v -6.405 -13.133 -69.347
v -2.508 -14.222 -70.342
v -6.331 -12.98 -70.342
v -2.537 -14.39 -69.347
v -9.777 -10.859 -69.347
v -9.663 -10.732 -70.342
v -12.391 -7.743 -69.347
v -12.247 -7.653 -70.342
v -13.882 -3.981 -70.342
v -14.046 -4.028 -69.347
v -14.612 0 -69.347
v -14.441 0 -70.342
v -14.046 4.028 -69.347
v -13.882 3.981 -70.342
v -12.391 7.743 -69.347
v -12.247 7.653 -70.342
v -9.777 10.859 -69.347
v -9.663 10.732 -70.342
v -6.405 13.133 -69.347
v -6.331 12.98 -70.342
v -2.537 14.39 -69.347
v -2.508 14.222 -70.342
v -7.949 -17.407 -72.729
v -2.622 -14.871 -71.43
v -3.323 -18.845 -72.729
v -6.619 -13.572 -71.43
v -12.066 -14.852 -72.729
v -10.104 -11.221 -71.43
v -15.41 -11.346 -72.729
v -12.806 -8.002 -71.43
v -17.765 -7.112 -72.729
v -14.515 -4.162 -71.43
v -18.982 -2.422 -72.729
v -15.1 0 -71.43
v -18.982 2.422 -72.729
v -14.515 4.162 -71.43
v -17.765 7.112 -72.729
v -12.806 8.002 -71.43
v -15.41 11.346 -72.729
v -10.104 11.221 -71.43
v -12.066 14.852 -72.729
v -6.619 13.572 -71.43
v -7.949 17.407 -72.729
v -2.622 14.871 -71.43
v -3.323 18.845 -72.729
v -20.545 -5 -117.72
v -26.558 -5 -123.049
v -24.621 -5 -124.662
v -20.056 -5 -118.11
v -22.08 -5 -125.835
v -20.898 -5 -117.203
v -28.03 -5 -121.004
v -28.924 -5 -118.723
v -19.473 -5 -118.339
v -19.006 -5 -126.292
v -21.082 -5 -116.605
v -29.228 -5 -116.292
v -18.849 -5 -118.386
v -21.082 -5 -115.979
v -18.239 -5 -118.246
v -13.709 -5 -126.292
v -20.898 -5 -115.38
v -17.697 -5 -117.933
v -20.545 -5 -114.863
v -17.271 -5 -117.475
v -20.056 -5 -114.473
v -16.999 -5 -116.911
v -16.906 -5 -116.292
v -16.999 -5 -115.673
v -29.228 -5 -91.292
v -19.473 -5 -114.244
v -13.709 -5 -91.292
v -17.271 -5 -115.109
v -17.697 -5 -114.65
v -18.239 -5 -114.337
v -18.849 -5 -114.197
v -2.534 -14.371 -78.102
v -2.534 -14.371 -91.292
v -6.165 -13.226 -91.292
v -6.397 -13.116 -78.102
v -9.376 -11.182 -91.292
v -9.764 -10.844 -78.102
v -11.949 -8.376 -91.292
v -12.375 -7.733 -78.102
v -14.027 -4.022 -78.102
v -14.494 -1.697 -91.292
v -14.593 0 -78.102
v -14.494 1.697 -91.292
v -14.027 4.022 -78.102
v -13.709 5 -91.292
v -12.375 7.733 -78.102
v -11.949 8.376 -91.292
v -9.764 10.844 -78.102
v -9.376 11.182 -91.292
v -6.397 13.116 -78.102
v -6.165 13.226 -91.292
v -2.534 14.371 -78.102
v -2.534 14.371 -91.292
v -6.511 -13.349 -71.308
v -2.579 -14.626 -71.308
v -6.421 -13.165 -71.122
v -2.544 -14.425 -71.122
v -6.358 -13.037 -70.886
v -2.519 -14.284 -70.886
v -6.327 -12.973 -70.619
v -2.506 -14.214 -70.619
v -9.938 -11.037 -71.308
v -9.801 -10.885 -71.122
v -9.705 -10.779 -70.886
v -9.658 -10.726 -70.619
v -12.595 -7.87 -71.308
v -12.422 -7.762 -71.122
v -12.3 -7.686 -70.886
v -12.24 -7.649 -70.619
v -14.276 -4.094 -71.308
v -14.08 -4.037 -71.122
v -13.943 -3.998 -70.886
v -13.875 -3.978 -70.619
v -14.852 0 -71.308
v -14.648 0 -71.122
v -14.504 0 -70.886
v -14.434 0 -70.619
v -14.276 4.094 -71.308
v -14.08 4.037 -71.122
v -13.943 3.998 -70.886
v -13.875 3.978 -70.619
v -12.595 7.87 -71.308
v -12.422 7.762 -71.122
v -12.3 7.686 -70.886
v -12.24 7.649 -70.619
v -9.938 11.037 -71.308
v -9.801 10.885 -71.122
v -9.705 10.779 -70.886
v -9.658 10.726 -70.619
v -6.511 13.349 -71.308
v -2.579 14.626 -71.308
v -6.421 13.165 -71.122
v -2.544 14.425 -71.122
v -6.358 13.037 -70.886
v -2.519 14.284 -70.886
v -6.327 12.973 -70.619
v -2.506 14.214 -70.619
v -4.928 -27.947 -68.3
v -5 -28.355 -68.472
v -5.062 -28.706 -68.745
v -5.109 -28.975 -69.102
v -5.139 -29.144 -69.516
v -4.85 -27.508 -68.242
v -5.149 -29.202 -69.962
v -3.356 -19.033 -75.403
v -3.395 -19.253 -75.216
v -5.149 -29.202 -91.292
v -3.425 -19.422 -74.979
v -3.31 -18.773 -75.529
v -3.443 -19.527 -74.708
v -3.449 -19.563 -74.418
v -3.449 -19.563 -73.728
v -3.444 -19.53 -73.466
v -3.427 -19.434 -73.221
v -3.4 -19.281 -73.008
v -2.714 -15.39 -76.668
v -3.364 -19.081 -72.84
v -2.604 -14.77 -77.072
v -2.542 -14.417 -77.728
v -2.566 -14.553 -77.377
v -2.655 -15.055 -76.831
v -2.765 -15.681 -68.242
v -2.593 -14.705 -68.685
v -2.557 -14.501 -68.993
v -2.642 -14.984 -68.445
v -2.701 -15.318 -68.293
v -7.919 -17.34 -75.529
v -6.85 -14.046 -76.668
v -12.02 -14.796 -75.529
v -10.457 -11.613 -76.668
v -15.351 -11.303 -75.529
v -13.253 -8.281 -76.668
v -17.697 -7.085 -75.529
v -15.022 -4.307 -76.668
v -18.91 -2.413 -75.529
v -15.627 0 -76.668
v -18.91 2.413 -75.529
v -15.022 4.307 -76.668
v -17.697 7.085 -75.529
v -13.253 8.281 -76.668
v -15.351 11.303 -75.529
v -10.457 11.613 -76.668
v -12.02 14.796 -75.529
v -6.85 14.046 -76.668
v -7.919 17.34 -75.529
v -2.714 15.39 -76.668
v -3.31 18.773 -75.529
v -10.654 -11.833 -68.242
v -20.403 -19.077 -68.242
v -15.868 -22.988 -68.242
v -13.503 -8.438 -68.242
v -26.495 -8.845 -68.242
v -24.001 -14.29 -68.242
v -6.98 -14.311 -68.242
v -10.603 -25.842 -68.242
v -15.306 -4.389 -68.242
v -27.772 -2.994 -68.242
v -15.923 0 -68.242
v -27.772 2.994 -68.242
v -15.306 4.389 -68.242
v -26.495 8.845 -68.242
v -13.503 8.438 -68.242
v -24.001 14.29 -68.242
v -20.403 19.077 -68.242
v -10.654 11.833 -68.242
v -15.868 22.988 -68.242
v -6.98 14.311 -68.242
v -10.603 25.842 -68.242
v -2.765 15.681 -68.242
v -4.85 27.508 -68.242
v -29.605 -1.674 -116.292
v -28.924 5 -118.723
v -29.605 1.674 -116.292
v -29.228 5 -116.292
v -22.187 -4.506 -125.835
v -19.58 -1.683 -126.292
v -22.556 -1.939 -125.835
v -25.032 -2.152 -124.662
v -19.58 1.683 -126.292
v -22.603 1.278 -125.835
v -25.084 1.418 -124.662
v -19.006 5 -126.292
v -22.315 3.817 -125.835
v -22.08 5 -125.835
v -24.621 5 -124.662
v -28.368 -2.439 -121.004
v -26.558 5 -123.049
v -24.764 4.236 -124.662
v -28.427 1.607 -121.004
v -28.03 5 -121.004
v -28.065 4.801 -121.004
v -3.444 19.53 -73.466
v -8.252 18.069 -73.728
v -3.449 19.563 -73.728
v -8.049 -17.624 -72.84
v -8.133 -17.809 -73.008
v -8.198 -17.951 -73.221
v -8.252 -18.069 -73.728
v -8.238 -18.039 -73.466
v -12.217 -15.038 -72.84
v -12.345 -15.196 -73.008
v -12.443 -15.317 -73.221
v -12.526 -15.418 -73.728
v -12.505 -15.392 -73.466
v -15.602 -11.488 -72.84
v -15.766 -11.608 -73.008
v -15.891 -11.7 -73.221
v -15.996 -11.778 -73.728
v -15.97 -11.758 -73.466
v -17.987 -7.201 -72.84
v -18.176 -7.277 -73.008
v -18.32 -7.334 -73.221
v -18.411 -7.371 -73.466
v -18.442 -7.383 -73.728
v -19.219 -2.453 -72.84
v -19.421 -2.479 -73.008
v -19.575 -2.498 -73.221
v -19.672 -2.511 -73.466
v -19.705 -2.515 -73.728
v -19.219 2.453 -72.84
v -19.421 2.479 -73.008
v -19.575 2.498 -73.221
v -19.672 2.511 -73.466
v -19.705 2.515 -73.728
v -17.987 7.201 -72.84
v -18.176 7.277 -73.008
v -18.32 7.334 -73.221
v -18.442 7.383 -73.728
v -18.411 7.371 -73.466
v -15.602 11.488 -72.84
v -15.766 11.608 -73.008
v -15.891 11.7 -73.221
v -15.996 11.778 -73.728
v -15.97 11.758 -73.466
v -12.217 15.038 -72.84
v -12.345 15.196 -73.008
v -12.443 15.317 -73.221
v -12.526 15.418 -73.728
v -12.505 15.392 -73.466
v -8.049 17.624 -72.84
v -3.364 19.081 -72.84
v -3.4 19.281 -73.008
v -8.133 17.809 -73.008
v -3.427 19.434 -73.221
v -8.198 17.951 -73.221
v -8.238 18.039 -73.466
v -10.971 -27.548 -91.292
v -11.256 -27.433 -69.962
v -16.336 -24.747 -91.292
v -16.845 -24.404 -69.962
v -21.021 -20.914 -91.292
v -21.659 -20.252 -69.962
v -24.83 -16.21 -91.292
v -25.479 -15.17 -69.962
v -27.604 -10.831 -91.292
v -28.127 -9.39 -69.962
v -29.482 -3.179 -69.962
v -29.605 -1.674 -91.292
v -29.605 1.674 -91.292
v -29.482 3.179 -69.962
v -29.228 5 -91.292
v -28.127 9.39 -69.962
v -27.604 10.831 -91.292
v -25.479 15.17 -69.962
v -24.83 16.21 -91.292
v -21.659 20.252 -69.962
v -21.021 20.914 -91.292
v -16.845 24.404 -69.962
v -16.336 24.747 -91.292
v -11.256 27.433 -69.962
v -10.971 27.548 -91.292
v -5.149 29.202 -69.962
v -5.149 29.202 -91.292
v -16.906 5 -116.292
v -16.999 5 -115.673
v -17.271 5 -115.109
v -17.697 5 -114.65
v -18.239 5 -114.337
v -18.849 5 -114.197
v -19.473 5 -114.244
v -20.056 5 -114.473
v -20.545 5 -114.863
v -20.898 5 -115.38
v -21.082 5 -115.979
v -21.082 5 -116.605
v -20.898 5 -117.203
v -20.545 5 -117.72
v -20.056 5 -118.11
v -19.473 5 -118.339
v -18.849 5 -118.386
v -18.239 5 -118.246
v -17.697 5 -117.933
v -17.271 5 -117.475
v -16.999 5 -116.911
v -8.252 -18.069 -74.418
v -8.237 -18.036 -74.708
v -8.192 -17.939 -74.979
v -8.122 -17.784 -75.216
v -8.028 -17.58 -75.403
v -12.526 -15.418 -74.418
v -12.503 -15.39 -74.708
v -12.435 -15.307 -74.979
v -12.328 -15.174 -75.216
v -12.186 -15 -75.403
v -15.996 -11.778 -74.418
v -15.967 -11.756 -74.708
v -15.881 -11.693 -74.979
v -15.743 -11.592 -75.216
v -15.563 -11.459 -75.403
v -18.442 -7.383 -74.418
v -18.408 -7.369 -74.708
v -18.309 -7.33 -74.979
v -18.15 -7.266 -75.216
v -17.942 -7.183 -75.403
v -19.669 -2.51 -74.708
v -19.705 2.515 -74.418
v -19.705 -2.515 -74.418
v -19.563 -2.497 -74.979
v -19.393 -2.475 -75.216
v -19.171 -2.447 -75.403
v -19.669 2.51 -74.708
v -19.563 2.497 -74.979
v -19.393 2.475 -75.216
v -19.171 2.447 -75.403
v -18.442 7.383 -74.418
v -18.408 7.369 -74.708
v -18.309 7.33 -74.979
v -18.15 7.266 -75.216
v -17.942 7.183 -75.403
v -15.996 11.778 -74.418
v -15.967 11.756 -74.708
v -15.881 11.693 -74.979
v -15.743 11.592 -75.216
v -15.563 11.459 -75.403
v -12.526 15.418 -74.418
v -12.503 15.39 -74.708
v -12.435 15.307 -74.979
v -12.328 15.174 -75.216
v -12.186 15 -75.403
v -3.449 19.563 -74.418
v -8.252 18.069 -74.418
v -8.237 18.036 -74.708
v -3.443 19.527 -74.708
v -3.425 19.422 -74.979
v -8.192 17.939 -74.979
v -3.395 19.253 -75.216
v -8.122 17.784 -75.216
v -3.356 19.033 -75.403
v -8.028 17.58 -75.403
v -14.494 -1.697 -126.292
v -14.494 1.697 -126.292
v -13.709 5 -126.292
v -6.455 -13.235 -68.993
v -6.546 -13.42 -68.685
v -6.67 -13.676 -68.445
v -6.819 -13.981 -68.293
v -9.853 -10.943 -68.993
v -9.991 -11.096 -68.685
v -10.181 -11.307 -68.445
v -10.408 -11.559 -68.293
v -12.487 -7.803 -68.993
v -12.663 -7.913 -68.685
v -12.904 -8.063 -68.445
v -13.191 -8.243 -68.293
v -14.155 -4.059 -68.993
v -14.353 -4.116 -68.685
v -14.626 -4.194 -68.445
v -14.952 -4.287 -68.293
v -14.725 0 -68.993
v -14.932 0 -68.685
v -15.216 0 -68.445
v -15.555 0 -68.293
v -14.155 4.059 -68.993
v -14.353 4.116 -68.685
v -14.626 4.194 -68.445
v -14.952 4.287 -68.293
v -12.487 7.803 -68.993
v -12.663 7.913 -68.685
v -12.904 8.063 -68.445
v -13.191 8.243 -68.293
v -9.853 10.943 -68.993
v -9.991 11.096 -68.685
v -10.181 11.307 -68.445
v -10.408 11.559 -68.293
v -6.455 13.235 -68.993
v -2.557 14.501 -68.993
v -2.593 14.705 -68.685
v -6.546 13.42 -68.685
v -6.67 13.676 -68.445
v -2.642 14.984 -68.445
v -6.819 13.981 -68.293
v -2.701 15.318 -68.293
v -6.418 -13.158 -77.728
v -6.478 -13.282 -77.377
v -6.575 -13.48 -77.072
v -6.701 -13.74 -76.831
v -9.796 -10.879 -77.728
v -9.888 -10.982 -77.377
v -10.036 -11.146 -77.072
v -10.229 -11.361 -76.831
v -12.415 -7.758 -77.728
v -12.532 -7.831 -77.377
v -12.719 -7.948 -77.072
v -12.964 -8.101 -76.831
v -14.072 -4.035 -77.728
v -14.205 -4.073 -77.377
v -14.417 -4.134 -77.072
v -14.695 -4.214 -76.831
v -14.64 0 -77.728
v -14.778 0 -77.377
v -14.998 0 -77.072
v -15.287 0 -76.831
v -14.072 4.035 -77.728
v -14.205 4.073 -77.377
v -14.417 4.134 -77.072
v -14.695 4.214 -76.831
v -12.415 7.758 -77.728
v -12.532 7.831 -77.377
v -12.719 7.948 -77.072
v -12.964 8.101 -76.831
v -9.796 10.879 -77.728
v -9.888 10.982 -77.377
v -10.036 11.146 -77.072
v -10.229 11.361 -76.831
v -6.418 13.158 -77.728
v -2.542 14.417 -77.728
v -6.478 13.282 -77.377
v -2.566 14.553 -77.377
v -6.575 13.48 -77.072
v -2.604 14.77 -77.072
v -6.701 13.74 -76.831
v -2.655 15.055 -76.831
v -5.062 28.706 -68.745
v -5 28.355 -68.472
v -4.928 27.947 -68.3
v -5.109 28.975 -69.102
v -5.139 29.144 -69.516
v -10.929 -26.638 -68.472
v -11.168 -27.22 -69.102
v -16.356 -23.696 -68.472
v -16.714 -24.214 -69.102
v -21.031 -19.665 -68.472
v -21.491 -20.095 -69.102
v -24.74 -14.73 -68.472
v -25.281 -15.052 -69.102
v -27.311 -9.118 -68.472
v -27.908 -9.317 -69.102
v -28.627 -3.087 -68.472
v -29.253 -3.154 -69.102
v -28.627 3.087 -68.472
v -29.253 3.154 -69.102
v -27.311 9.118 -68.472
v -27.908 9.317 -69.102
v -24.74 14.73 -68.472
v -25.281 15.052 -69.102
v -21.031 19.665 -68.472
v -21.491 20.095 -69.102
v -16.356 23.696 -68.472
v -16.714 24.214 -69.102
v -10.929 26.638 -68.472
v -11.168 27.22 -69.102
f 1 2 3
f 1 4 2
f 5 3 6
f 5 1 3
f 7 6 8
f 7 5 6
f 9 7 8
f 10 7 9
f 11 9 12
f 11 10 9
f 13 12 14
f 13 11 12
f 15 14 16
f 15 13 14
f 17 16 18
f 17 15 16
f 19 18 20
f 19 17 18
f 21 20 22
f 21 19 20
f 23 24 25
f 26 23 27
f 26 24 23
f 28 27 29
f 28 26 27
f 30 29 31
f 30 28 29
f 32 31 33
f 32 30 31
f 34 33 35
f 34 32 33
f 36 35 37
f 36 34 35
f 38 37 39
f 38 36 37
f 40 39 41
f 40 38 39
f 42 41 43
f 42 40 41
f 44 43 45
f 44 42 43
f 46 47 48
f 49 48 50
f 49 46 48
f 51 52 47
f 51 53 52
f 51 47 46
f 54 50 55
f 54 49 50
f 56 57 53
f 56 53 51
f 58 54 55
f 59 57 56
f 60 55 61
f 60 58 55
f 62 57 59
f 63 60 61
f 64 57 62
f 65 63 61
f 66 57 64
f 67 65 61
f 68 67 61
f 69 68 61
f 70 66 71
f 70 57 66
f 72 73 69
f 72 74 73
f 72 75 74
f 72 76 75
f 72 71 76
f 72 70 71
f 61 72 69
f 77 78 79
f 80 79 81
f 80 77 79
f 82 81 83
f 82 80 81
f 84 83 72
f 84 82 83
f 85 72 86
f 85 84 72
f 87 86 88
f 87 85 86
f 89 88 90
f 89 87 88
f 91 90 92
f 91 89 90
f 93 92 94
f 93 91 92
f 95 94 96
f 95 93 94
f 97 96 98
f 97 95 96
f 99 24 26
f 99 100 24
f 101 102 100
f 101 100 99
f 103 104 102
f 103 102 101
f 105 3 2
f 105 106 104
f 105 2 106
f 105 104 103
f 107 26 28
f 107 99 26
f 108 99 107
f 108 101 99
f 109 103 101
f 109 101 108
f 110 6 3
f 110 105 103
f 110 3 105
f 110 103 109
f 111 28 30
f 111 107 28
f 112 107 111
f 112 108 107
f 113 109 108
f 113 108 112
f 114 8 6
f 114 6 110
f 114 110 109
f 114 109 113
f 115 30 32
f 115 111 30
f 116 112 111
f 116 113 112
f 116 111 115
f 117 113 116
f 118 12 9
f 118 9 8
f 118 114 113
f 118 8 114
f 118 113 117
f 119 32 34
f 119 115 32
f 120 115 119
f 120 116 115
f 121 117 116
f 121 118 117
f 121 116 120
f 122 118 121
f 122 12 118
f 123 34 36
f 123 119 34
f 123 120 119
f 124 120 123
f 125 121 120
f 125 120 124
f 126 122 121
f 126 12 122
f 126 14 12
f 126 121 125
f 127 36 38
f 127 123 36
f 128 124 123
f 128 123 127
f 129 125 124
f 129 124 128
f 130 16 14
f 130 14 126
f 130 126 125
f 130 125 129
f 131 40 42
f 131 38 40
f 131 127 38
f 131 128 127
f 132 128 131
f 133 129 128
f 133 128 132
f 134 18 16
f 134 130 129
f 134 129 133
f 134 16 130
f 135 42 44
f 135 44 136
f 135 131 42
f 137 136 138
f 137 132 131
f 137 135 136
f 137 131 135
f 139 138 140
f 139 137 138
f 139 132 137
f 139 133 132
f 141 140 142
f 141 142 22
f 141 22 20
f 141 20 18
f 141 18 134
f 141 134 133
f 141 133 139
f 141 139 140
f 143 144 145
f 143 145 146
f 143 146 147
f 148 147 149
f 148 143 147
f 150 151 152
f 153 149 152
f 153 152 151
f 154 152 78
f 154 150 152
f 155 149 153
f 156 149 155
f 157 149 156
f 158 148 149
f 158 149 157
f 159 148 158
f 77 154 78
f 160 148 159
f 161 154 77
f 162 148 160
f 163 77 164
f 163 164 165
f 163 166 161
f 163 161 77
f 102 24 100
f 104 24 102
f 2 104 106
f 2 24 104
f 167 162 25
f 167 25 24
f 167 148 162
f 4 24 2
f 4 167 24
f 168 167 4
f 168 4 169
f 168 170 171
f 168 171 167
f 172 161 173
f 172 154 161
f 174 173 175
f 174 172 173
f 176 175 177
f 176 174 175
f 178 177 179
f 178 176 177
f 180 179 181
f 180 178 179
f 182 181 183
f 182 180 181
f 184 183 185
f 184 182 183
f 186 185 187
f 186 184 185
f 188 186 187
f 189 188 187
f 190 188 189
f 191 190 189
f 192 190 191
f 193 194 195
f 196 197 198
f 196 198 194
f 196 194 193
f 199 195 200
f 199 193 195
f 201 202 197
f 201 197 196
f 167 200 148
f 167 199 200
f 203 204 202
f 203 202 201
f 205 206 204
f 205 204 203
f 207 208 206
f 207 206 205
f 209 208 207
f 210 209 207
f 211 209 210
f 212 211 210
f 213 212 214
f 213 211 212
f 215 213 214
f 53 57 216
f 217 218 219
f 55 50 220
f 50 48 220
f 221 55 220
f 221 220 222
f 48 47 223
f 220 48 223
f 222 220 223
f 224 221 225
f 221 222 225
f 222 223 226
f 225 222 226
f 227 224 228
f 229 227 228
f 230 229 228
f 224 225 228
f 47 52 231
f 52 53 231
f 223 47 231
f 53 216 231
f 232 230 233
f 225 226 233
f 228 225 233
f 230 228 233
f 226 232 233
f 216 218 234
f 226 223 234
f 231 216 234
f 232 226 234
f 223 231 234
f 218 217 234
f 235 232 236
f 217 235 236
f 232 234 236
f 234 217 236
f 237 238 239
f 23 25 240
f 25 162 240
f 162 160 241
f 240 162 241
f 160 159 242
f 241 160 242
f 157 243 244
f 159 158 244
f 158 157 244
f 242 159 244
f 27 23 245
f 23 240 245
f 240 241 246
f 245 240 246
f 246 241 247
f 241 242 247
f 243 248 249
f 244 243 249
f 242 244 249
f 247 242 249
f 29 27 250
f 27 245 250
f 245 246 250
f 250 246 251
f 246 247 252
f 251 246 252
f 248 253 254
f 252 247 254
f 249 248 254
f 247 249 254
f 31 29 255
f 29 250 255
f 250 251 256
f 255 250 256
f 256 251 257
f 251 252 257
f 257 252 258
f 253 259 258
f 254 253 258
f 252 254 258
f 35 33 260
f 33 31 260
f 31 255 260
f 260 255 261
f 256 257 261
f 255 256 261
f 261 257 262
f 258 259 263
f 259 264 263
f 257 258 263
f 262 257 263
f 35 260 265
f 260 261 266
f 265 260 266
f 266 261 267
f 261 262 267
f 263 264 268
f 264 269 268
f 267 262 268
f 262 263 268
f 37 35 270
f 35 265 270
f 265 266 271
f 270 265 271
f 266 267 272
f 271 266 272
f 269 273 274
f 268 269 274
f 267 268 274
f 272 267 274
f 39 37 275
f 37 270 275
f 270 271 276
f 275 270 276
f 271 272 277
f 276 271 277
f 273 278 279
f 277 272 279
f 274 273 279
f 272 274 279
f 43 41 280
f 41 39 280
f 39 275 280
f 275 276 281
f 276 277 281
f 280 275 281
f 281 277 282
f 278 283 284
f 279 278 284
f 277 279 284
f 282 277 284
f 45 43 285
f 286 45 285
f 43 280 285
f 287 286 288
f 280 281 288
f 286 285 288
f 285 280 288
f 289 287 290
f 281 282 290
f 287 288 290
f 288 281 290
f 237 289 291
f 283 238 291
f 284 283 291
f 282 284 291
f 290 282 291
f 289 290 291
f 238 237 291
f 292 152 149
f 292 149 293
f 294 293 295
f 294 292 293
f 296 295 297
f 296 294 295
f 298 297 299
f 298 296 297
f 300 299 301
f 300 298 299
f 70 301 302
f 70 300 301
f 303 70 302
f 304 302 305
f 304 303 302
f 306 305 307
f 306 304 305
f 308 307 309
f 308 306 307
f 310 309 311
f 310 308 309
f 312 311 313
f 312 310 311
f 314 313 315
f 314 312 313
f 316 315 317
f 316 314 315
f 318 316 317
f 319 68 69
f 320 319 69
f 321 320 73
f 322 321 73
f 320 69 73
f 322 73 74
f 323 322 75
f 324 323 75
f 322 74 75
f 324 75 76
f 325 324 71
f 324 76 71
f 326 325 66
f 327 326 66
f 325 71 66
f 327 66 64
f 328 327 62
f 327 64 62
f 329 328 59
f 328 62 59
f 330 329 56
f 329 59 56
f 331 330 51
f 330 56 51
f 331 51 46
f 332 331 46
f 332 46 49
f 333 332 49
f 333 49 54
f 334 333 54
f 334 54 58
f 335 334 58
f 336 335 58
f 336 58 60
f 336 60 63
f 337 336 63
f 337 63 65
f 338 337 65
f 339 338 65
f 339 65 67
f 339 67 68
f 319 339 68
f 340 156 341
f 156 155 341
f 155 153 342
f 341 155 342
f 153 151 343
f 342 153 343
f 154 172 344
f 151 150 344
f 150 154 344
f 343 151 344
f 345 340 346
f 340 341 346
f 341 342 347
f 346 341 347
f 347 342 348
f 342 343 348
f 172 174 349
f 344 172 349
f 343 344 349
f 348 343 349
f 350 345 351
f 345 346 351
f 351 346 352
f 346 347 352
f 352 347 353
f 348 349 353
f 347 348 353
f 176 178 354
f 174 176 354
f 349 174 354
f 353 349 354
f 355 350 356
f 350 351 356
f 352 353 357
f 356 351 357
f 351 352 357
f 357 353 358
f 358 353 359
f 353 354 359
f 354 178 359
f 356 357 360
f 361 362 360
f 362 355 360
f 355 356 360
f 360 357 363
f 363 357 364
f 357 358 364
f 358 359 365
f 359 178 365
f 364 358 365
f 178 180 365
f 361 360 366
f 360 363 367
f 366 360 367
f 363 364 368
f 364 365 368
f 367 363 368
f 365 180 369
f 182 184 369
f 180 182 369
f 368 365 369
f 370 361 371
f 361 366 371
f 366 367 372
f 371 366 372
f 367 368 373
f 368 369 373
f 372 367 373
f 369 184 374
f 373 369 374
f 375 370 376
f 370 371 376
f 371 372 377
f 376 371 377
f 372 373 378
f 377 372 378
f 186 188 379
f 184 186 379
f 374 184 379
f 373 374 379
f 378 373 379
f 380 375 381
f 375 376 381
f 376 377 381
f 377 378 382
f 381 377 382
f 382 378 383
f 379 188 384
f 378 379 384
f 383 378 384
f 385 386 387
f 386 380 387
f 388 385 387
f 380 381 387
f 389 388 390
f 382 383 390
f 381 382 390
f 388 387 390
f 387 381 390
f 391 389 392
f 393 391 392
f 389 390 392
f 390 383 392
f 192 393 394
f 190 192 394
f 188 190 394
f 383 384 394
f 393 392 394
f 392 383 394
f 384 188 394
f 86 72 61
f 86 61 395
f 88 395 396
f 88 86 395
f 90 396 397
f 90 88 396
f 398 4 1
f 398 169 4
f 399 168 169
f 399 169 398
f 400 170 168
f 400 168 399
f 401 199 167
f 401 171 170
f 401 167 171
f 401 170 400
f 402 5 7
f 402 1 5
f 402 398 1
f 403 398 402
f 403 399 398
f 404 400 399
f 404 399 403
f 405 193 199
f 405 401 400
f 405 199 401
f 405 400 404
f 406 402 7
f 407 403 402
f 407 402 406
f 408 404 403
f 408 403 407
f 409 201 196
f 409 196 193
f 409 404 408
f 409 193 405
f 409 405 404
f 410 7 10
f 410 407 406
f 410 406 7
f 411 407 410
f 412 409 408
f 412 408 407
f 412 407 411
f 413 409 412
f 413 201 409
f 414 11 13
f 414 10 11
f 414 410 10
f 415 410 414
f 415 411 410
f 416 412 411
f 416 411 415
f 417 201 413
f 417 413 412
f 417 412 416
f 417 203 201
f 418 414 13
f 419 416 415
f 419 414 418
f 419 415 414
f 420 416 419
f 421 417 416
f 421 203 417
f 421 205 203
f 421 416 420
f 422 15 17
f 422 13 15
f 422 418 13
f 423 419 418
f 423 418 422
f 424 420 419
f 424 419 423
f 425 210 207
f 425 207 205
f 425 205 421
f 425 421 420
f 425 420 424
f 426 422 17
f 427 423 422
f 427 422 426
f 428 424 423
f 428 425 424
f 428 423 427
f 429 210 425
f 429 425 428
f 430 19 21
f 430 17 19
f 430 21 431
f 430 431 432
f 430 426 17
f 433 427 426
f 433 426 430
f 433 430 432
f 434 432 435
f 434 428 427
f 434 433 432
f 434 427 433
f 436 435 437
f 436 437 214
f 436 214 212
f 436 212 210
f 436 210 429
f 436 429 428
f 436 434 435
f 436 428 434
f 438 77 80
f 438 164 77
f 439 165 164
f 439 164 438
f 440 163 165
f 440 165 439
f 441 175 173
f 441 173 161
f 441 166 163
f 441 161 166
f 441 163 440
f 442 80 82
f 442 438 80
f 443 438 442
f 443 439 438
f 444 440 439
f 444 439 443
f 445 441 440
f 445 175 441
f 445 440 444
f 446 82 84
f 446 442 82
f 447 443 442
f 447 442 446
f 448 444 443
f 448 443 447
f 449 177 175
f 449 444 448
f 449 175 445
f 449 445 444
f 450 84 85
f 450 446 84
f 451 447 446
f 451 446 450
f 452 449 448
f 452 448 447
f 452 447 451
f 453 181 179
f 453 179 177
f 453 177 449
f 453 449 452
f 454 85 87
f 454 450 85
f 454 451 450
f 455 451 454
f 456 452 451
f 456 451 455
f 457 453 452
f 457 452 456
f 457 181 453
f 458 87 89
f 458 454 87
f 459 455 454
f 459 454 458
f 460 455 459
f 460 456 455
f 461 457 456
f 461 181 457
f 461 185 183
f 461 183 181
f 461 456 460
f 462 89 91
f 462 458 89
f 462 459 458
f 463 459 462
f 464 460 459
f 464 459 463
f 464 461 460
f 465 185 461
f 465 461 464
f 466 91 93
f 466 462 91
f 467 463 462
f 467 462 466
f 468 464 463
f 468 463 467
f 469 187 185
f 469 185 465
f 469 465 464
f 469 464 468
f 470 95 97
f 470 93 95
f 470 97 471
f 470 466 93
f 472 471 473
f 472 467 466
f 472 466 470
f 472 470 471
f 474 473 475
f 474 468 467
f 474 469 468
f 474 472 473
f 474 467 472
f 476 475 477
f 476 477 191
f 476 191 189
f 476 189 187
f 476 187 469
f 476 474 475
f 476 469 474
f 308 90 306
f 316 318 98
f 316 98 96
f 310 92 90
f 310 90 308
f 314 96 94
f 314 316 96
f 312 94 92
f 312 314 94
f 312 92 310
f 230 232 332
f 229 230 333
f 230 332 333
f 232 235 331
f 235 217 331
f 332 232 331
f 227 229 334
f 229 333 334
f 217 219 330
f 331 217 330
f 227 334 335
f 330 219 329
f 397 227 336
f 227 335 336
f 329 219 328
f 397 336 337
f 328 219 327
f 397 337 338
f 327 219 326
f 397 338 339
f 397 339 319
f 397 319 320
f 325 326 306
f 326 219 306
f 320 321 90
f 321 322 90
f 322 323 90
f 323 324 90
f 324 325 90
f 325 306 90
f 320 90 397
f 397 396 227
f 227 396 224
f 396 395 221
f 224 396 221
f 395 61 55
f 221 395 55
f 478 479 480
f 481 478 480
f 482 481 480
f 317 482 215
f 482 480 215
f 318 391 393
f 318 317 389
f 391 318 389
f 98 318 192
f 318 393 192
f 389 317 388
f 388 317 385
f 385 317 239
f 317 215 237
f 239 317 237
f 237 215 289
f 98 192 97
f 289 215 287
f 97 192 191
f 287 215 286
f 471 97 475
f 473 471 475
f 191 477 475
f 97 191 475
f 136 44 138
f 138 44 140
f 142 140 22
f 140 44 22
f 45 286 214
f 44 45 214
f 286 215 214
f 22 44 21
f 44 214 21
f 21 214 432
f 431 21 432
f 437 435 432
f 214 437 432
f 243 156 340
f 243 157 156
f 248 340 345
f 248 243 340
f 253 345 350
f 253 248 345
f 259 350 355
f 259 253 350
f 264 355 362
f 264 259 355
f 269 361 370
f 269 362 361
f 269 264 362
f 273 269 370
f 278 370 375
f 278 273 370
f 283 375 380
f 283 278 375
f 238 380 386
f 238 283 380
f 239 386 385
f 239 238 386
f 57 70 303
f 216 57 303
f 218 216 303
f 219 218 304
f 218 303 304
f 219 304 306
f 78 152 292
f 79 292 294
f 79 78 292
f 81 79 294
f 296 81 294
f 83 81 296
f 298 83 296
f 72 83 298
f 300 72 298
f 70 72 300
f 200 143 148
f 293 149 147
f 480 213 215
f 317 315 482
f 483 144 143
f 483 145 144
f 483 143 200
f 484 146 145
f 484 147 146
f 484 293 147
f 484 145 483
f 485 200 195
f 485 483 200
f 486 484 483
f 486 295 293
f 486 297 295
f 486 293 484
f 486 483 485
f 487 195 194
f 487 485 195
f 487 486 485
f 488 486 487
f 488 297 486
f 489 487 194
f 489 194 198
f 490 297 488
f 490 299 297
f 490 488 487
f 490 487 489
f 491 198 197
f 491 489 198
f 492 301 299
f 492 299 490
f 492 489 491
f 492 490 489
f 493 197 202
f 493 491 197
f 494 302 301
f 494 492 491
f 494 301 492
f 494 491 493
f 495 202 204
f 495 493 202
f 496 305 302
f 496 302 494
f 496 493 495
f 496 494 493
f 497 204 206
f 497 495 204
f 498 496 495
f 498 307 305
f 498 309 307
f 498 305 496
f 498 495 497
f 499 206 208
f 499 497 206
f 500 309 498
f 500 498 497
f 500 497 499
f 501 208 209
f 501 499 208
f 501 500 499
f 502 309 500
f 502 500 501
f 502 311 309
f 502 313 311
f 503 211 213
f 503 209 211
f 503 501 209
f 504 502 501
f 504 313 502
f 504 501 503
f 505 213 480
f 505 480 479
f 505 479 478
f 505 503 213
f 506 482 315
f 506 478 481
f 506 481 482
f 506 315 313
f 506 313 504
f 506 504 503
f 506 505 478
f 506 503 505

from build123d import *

# Parameters (mm, degrees)
REVOLUTION002_ANGLE = 160
PAD003_DEPTH        = 35
FILLET_R            = 10
SKETCH016_R         = 2.1
POCKET006_DEPTH     = 34.2030828023


with BuildPart() as part:
    # Sketch013 → Revolution002 (revolve, symmetric)
    with BuildSketch(Plane.XZ) as revolution002_sk:
        with BuildLine():
            Line((-14.592572, -91.29162), (-14.592572, -78.10162))
            ThreePointArc((-14.592572, -78.10162), (-14.8782194915, -77.2178434814), (-15.6270897945, -76.6684358973))
            Line((-15.6270897945, -76.6684358973), (-19.0629351267, -75.5285381595))
            ThreePointArc((-19.8645151397, -74.4180577621), (-19.6431856264, -75.1028382434), (-19.0629351267, -75.5285381595))
            Line((-19.8645151397, -74.4180577621), (-19.8645151397, -73.7280577621))
            ThreePointArc((-19.1361680024, -72.7285381595), (-19.6631126608, -73.1096871232), (-19.8645151397, -73.7280577621))
            Line((-19.1361680024, -72.7285381595), (-15.100012655, -71.4296732661))
            ThreePointArc((-15.100012655, -71.4296732661), (-14.5676210475, -71.009067316), (-14.4410938084, -70.3424782022))
            Line((-14.4410938084, -70.3424782022), (-14.6116789932, -69.3469880241))
            ThreePointArc((-14.6116789932, -69.3469880241), (-15.0652099201, -68.5548455589), (-15.922572, -68.24162))
            Line((-15.922572, -68.24162), (-27.932572, -68.24162))
            ThreePointArc((-27.932572, -68.24162), (-29.1487956636, -68.7453963364), (-29.652572, -69.96162))
            Line((-29.652572, -69.96162), (-29.652572, -91.29162))
            Line((-29.652572, -91.29162), (-14.592572, -91.29162))
        make_face()
    revolve(axis=Axis((0, 0, 0), (0, 0, 1)), revolution_arc=REVOLUTION002_ANGLE / 2)
    revolve(revolution002_sk.sketch, axis=Axis((0, 0, 0), (0, 0, -1)), revolution_arc=REVOLUTION002_ANGLE / 2)

    # Sketch014 (on Face8 of Revolution002) → Pad003 (new body)
    with BuildSketch(Plane(origin=(0, 0, -91.29162), x_dir=(1, 0, 0), z_dir=(0, 0, -1))):
        with BuildLine():
            Line((-29.2279836153, 5), (-13.7092362141, 5))
            ThreePointArc((-13.7092362141, 5), (-14.592572, 0), (-13.7092362141, -5))
            Line((-29.2279836153, -5), (-13.7092362141, -5))
            ThreePointArc((-29.2279836153, 5), (-29.652572, 0), (-29.2279836153, -5))
        make_face()
    extrude(amount=PAD003_DEPTH)

    # Fillet
    fillet_edges = [part.edges().sort_by_distance(p)[0] for p in [
        (-29.652572, 0, -126.29162),
    ]]
    fillet(fillet_edges, radius=FILLET_R)

    # Sketch016 (on Face2 of Fillet) → Pocket006 (cut, through all)
    with BuildSketch(Plane.XZ.offset(5)):
        with Locations((-19.005882937, -116.29162)):
            Circle(SKETCH016_R)
    extrude(amount=-POCKET006_DEPTH, mode=Mode.SUBTRACT)


solid = part.part
